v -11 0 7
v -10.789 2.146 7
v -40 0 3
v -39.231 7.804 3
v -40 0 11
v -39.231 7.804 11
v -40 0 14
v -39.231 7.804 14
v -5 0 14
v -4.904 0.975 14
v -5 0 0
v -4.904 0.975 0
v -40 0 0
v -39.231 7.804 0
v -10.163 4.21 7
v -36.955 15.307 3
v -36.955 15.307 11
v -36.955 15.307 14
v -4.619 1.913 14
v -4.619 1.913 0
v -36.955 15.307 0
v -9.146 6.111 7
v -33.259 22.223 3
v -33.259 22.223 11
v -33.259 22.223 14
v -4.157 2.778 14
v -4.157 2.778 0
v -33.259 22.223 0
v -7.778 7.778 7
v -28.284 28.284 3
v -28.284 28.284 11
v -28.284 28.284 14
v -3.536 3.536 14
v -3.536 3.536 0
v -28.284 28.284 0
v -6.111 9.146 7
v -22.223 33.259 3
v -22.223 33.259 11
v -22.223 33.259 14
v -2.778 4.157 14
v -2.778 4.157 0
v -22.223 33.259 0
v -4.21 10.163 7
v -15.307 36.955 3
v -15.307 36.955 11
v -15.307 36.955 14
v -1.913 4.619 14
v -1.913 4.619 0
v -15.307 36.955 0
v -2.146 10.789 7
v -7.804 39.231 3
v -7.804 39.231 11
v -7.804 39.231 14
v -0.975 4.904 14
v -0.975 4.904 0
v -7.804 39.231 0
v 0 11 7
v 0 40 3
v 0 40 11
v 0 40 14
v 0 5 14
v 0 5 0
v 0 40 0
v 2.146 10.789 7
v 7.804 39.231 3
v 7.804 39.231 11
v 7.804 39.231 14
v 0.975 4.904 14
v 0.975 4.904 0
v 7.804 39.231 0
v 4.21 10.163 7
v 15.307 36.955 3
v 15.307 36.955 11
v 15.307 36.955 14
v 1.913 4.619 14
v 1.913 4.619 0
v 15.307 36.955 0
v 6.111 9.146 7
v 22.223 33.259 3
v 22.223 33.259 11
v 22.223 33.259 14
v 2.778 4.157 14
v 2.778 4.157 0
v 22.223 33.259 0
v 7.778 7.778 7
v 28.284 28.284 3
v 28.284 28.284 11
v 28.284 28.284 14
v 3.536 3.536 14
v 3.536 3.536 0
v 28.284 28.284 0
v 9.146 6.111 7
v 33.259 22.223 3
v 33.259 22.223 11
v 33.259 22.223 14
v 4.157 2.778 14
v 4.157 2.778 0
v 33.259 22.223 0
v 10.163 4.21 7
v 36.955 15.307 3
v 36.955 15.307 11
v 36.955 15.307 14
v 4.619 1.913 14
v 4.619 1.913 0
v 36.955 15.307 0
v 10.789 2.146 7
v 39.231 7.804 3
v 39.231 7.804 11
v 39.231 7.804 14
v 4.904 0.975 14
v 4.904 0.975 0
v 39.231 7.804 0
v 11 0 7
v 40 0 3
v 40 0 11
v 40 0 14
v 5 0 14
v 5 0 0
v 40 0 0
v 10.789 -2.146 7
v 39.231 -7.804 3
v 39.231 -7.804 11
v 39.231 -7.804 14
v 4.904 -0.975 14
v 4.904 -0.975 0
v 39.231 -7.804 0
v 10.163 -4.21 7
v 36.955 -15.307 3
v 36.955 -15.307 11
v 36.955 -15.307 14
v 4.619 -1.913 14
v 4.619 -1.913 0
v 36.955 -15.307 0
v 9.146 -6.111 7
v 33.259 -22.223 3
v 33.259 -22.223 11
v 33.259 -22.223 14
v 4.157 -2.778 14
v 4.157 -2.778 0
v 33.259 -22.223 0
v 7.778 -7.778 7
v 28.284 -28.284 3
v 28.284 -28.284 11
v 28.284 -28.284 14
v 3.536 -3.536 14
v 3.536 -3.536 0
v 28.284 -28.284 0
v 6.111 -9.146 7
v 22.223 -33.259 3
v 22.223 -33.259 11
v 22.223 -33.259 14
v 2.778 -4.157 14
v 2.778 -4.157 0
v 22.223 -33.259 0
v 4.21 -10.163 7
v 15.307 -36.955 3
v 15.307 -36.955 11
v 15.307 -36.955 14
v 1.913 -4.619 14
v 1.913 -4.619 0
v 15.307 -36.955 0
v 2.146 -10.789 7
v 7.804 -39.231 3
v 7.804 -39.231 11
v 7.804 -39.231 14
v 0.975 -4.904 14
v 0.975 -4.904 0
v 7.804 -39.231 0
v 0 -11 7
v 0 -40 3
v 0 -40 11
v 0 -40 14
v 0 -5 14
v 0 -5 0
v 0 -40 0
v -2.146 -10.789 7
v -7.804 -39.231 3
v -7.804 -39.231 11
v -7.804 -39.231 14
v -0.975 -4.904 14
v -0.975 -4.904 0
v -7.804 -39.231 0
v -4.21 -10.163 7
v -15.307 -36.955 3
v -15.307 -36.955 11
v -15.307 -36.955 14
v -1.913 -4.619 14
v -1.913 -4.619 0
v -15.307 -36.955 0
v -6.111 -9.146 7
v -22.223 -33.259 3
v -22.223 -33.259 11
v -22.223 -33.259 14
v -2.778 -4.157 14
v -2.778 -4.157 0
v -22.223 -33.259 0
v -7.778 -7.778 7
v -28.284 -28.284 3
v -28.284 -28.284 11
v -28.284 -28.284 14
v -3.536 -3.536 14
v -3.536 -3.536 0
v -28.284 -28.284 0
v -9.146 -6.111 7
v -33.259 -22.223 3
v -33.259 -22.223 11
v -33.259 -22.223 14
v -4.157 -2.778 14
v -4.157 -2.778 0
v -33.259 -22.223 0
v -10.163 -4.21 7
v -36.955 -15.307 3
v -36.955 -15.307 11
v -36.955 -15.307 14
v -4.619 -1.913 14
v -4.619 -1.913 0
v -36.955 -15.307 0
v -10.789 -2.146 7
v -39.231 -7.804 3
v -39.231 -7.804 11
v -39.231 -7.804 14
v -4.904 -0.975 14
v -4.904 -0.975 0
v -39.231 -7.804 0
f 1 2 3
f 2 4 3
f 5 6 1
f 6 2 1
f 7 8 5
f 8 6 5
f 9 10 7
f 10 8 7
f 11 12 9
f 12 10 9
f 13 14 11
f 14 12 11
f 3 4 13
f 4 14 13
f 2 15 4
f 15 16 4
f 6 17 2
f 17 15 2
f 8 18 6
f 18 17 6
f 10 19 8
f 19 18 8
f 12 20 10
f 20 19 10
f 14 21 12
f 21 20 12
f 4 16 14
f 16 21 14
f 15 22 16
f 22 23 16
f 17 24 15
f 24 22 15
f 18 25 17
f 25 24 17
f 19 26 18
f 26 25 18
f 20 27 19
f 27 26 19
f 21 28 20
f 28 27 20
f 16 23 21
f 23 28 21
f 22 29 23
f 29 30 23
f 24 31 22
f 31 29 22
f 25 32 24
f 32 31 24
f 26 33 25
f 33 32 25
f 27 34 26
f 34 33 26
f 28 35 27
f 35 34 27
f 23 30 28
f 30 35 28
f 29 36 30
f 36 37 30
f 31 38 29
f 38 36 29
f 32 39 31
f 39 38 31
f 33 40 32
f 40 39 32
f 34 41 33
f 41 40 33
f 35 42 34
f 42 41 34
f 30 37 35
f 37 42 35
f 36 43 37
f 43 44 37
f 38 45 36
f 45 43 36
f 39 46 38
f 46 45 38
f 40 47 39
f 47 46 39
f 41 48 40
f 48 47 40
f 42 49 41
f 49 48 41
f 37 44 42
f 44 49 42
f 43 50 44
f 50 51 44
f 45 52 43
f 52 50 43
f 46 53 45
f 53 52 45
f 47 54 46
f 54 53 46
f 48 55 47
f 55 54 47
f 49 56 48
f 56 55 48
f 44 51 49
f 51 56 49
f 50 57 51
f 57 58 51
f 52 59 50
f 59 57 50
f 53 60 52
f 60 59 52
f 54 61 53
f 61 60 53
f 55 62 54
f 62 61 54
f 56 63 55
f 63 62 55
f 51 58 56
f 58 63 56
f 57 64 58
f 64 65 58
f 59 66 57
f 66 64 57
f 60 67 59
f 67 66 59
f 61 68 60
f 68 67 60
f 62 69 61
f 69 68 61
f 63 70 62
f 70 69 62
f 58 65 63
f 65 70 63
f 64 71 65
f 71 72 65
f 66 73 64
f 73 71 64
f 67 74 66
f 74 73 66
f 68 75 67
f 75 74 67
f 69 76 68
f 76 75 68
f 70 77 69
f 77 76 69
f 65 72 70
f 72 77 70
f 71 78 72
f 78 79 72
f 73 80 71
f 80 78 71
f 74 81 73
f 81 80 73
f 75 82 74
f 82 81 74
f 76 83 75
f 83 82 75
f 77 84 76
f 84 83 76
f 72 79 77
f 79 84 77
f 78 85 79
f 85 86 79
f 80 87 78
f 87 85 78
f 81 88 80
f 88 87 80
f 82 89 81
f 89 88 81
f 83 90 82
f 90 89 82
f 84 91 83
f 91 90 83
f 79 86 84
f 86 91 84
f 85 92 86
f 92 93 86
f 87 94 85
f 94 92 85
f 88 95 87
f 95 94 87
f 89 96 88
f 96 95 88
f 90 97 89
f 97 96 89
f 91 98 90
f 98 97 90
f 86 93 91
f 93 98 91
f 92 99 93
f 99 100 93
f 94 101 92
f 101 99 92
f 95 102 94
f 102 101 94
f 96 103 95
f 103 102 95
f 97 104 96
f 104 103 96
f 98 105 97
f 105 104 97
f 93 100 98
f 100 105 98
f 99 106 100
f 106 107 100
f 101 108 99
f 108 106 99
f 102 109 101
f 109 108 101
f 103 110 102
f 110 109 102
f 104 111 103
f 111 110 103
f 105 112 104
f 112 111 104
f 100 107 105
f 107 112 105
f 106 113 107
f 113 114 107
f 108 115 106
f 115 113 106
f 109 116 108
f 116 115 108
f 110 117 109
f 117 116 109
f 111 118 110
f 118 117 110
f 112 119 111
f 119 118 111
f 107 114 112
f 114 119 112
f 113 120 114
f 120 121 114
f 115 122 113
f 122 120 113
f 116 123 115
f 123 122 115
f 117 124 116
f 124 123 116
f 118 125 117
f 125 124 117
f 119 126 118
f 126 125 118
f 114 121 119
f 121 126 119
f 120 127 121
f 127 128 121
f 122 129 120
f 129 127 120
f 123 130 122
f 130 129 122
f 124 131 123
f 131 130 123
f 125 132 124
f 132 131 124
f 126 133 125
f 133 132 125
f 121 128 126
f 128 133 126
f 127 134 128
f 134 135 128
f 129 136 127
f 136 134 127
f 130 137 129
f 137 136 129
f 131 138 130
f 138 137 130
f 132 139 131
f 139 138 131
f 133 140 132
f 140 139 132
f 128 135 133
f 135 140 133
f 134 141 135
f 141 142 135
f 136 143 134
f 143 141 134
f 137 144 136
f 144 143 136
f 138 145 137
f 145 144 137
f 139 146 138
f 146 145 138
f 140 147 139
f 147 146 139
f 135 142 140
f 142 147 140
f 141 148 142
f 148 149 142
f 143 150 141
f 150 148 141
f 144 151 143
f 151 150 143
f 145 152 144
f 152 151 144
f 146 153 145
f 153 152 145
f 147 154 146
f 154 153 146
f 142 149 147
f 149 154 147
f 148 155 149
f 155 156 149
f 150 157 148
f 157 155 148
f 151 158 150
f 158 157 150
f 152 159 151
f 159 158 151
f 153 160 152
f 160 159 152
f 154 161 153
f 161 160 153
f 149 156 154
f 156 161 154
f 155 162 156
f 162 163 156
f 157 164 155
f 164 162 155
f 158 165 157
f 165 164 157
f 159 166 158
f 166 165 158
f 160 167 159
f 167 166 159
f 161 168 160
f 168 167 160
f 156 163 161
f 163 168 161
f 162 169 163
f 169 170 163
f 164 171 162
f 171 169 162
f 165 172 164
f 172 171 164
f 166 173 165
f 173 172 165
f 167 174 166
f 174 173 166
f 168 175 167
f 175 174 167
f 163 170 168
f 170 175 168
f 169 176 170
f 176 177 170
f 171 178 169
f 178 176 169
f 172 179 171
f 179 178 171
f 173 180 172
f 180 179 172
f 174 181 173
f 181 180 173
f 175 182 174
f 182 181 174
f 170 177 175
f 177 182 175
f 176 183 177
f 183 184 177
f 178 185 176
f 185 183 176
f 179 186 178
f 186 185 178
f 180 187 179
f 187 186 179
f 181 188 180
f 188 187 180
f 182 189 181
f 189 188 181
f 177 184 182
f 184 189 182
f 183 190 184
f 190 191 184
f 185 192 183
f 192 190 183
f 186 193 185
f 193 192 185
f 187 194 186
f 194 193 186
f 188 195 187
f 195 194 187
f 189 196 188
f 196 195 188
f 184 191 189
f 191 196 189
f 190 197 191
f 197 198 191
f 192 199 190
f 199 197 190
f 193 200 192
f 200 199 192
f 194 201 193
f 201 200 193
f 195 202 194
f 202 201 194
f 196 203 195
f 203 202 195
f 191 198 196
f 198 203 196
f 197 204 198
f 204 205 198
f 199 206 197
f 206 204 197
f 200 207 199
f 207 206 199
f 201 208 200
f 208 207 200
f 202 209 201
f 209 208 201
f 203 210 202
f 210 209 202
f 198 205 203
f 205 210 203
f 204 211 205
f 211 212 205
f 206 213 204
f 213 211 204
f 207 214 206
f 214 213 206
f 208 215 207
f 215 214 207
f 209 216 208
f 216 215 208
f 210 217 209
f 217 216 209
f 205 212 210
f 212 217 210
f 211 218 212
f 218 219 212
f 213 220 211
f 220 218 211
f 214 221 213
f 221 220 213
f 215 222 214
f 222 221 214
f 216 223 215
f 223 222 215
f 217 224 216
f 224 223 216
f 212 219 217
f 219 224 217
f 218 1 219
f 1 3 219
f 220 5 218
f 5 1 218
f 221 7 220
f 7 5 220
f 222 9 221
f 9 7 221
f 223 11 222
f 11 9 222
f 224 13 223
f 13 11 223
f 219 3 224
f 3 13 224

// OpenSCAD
$fn = 32;

// ----------------------------------------------------------------------
// Revolved part: V-groove pulley R40
// ----------------------------------------------------------------------

// --- parameters (mm) ---
bore_r = 5;               // bore radius
rim_r = 40;               // rim radius
rim_t = 14;               // rim width
groove_r = 11;            // groove root radius
groove_w = 4;             // groove half width
revolve_angle = 360;      // revolve sweep, degrees

bore_d = 2 * bore_r;
rim_d = 2 * rim_r;
groove_d = 2 * groove_r;

profile = [[5, 0], [40, 0], [40, 3], [11, 7], [40, 11], [40, 14], [5, 14]];  // primary outline, 7 points, counter clockwise

// --- the one profile operation ---
rotate_extrude(angle = revolve_angle) polygon(points = profile);
